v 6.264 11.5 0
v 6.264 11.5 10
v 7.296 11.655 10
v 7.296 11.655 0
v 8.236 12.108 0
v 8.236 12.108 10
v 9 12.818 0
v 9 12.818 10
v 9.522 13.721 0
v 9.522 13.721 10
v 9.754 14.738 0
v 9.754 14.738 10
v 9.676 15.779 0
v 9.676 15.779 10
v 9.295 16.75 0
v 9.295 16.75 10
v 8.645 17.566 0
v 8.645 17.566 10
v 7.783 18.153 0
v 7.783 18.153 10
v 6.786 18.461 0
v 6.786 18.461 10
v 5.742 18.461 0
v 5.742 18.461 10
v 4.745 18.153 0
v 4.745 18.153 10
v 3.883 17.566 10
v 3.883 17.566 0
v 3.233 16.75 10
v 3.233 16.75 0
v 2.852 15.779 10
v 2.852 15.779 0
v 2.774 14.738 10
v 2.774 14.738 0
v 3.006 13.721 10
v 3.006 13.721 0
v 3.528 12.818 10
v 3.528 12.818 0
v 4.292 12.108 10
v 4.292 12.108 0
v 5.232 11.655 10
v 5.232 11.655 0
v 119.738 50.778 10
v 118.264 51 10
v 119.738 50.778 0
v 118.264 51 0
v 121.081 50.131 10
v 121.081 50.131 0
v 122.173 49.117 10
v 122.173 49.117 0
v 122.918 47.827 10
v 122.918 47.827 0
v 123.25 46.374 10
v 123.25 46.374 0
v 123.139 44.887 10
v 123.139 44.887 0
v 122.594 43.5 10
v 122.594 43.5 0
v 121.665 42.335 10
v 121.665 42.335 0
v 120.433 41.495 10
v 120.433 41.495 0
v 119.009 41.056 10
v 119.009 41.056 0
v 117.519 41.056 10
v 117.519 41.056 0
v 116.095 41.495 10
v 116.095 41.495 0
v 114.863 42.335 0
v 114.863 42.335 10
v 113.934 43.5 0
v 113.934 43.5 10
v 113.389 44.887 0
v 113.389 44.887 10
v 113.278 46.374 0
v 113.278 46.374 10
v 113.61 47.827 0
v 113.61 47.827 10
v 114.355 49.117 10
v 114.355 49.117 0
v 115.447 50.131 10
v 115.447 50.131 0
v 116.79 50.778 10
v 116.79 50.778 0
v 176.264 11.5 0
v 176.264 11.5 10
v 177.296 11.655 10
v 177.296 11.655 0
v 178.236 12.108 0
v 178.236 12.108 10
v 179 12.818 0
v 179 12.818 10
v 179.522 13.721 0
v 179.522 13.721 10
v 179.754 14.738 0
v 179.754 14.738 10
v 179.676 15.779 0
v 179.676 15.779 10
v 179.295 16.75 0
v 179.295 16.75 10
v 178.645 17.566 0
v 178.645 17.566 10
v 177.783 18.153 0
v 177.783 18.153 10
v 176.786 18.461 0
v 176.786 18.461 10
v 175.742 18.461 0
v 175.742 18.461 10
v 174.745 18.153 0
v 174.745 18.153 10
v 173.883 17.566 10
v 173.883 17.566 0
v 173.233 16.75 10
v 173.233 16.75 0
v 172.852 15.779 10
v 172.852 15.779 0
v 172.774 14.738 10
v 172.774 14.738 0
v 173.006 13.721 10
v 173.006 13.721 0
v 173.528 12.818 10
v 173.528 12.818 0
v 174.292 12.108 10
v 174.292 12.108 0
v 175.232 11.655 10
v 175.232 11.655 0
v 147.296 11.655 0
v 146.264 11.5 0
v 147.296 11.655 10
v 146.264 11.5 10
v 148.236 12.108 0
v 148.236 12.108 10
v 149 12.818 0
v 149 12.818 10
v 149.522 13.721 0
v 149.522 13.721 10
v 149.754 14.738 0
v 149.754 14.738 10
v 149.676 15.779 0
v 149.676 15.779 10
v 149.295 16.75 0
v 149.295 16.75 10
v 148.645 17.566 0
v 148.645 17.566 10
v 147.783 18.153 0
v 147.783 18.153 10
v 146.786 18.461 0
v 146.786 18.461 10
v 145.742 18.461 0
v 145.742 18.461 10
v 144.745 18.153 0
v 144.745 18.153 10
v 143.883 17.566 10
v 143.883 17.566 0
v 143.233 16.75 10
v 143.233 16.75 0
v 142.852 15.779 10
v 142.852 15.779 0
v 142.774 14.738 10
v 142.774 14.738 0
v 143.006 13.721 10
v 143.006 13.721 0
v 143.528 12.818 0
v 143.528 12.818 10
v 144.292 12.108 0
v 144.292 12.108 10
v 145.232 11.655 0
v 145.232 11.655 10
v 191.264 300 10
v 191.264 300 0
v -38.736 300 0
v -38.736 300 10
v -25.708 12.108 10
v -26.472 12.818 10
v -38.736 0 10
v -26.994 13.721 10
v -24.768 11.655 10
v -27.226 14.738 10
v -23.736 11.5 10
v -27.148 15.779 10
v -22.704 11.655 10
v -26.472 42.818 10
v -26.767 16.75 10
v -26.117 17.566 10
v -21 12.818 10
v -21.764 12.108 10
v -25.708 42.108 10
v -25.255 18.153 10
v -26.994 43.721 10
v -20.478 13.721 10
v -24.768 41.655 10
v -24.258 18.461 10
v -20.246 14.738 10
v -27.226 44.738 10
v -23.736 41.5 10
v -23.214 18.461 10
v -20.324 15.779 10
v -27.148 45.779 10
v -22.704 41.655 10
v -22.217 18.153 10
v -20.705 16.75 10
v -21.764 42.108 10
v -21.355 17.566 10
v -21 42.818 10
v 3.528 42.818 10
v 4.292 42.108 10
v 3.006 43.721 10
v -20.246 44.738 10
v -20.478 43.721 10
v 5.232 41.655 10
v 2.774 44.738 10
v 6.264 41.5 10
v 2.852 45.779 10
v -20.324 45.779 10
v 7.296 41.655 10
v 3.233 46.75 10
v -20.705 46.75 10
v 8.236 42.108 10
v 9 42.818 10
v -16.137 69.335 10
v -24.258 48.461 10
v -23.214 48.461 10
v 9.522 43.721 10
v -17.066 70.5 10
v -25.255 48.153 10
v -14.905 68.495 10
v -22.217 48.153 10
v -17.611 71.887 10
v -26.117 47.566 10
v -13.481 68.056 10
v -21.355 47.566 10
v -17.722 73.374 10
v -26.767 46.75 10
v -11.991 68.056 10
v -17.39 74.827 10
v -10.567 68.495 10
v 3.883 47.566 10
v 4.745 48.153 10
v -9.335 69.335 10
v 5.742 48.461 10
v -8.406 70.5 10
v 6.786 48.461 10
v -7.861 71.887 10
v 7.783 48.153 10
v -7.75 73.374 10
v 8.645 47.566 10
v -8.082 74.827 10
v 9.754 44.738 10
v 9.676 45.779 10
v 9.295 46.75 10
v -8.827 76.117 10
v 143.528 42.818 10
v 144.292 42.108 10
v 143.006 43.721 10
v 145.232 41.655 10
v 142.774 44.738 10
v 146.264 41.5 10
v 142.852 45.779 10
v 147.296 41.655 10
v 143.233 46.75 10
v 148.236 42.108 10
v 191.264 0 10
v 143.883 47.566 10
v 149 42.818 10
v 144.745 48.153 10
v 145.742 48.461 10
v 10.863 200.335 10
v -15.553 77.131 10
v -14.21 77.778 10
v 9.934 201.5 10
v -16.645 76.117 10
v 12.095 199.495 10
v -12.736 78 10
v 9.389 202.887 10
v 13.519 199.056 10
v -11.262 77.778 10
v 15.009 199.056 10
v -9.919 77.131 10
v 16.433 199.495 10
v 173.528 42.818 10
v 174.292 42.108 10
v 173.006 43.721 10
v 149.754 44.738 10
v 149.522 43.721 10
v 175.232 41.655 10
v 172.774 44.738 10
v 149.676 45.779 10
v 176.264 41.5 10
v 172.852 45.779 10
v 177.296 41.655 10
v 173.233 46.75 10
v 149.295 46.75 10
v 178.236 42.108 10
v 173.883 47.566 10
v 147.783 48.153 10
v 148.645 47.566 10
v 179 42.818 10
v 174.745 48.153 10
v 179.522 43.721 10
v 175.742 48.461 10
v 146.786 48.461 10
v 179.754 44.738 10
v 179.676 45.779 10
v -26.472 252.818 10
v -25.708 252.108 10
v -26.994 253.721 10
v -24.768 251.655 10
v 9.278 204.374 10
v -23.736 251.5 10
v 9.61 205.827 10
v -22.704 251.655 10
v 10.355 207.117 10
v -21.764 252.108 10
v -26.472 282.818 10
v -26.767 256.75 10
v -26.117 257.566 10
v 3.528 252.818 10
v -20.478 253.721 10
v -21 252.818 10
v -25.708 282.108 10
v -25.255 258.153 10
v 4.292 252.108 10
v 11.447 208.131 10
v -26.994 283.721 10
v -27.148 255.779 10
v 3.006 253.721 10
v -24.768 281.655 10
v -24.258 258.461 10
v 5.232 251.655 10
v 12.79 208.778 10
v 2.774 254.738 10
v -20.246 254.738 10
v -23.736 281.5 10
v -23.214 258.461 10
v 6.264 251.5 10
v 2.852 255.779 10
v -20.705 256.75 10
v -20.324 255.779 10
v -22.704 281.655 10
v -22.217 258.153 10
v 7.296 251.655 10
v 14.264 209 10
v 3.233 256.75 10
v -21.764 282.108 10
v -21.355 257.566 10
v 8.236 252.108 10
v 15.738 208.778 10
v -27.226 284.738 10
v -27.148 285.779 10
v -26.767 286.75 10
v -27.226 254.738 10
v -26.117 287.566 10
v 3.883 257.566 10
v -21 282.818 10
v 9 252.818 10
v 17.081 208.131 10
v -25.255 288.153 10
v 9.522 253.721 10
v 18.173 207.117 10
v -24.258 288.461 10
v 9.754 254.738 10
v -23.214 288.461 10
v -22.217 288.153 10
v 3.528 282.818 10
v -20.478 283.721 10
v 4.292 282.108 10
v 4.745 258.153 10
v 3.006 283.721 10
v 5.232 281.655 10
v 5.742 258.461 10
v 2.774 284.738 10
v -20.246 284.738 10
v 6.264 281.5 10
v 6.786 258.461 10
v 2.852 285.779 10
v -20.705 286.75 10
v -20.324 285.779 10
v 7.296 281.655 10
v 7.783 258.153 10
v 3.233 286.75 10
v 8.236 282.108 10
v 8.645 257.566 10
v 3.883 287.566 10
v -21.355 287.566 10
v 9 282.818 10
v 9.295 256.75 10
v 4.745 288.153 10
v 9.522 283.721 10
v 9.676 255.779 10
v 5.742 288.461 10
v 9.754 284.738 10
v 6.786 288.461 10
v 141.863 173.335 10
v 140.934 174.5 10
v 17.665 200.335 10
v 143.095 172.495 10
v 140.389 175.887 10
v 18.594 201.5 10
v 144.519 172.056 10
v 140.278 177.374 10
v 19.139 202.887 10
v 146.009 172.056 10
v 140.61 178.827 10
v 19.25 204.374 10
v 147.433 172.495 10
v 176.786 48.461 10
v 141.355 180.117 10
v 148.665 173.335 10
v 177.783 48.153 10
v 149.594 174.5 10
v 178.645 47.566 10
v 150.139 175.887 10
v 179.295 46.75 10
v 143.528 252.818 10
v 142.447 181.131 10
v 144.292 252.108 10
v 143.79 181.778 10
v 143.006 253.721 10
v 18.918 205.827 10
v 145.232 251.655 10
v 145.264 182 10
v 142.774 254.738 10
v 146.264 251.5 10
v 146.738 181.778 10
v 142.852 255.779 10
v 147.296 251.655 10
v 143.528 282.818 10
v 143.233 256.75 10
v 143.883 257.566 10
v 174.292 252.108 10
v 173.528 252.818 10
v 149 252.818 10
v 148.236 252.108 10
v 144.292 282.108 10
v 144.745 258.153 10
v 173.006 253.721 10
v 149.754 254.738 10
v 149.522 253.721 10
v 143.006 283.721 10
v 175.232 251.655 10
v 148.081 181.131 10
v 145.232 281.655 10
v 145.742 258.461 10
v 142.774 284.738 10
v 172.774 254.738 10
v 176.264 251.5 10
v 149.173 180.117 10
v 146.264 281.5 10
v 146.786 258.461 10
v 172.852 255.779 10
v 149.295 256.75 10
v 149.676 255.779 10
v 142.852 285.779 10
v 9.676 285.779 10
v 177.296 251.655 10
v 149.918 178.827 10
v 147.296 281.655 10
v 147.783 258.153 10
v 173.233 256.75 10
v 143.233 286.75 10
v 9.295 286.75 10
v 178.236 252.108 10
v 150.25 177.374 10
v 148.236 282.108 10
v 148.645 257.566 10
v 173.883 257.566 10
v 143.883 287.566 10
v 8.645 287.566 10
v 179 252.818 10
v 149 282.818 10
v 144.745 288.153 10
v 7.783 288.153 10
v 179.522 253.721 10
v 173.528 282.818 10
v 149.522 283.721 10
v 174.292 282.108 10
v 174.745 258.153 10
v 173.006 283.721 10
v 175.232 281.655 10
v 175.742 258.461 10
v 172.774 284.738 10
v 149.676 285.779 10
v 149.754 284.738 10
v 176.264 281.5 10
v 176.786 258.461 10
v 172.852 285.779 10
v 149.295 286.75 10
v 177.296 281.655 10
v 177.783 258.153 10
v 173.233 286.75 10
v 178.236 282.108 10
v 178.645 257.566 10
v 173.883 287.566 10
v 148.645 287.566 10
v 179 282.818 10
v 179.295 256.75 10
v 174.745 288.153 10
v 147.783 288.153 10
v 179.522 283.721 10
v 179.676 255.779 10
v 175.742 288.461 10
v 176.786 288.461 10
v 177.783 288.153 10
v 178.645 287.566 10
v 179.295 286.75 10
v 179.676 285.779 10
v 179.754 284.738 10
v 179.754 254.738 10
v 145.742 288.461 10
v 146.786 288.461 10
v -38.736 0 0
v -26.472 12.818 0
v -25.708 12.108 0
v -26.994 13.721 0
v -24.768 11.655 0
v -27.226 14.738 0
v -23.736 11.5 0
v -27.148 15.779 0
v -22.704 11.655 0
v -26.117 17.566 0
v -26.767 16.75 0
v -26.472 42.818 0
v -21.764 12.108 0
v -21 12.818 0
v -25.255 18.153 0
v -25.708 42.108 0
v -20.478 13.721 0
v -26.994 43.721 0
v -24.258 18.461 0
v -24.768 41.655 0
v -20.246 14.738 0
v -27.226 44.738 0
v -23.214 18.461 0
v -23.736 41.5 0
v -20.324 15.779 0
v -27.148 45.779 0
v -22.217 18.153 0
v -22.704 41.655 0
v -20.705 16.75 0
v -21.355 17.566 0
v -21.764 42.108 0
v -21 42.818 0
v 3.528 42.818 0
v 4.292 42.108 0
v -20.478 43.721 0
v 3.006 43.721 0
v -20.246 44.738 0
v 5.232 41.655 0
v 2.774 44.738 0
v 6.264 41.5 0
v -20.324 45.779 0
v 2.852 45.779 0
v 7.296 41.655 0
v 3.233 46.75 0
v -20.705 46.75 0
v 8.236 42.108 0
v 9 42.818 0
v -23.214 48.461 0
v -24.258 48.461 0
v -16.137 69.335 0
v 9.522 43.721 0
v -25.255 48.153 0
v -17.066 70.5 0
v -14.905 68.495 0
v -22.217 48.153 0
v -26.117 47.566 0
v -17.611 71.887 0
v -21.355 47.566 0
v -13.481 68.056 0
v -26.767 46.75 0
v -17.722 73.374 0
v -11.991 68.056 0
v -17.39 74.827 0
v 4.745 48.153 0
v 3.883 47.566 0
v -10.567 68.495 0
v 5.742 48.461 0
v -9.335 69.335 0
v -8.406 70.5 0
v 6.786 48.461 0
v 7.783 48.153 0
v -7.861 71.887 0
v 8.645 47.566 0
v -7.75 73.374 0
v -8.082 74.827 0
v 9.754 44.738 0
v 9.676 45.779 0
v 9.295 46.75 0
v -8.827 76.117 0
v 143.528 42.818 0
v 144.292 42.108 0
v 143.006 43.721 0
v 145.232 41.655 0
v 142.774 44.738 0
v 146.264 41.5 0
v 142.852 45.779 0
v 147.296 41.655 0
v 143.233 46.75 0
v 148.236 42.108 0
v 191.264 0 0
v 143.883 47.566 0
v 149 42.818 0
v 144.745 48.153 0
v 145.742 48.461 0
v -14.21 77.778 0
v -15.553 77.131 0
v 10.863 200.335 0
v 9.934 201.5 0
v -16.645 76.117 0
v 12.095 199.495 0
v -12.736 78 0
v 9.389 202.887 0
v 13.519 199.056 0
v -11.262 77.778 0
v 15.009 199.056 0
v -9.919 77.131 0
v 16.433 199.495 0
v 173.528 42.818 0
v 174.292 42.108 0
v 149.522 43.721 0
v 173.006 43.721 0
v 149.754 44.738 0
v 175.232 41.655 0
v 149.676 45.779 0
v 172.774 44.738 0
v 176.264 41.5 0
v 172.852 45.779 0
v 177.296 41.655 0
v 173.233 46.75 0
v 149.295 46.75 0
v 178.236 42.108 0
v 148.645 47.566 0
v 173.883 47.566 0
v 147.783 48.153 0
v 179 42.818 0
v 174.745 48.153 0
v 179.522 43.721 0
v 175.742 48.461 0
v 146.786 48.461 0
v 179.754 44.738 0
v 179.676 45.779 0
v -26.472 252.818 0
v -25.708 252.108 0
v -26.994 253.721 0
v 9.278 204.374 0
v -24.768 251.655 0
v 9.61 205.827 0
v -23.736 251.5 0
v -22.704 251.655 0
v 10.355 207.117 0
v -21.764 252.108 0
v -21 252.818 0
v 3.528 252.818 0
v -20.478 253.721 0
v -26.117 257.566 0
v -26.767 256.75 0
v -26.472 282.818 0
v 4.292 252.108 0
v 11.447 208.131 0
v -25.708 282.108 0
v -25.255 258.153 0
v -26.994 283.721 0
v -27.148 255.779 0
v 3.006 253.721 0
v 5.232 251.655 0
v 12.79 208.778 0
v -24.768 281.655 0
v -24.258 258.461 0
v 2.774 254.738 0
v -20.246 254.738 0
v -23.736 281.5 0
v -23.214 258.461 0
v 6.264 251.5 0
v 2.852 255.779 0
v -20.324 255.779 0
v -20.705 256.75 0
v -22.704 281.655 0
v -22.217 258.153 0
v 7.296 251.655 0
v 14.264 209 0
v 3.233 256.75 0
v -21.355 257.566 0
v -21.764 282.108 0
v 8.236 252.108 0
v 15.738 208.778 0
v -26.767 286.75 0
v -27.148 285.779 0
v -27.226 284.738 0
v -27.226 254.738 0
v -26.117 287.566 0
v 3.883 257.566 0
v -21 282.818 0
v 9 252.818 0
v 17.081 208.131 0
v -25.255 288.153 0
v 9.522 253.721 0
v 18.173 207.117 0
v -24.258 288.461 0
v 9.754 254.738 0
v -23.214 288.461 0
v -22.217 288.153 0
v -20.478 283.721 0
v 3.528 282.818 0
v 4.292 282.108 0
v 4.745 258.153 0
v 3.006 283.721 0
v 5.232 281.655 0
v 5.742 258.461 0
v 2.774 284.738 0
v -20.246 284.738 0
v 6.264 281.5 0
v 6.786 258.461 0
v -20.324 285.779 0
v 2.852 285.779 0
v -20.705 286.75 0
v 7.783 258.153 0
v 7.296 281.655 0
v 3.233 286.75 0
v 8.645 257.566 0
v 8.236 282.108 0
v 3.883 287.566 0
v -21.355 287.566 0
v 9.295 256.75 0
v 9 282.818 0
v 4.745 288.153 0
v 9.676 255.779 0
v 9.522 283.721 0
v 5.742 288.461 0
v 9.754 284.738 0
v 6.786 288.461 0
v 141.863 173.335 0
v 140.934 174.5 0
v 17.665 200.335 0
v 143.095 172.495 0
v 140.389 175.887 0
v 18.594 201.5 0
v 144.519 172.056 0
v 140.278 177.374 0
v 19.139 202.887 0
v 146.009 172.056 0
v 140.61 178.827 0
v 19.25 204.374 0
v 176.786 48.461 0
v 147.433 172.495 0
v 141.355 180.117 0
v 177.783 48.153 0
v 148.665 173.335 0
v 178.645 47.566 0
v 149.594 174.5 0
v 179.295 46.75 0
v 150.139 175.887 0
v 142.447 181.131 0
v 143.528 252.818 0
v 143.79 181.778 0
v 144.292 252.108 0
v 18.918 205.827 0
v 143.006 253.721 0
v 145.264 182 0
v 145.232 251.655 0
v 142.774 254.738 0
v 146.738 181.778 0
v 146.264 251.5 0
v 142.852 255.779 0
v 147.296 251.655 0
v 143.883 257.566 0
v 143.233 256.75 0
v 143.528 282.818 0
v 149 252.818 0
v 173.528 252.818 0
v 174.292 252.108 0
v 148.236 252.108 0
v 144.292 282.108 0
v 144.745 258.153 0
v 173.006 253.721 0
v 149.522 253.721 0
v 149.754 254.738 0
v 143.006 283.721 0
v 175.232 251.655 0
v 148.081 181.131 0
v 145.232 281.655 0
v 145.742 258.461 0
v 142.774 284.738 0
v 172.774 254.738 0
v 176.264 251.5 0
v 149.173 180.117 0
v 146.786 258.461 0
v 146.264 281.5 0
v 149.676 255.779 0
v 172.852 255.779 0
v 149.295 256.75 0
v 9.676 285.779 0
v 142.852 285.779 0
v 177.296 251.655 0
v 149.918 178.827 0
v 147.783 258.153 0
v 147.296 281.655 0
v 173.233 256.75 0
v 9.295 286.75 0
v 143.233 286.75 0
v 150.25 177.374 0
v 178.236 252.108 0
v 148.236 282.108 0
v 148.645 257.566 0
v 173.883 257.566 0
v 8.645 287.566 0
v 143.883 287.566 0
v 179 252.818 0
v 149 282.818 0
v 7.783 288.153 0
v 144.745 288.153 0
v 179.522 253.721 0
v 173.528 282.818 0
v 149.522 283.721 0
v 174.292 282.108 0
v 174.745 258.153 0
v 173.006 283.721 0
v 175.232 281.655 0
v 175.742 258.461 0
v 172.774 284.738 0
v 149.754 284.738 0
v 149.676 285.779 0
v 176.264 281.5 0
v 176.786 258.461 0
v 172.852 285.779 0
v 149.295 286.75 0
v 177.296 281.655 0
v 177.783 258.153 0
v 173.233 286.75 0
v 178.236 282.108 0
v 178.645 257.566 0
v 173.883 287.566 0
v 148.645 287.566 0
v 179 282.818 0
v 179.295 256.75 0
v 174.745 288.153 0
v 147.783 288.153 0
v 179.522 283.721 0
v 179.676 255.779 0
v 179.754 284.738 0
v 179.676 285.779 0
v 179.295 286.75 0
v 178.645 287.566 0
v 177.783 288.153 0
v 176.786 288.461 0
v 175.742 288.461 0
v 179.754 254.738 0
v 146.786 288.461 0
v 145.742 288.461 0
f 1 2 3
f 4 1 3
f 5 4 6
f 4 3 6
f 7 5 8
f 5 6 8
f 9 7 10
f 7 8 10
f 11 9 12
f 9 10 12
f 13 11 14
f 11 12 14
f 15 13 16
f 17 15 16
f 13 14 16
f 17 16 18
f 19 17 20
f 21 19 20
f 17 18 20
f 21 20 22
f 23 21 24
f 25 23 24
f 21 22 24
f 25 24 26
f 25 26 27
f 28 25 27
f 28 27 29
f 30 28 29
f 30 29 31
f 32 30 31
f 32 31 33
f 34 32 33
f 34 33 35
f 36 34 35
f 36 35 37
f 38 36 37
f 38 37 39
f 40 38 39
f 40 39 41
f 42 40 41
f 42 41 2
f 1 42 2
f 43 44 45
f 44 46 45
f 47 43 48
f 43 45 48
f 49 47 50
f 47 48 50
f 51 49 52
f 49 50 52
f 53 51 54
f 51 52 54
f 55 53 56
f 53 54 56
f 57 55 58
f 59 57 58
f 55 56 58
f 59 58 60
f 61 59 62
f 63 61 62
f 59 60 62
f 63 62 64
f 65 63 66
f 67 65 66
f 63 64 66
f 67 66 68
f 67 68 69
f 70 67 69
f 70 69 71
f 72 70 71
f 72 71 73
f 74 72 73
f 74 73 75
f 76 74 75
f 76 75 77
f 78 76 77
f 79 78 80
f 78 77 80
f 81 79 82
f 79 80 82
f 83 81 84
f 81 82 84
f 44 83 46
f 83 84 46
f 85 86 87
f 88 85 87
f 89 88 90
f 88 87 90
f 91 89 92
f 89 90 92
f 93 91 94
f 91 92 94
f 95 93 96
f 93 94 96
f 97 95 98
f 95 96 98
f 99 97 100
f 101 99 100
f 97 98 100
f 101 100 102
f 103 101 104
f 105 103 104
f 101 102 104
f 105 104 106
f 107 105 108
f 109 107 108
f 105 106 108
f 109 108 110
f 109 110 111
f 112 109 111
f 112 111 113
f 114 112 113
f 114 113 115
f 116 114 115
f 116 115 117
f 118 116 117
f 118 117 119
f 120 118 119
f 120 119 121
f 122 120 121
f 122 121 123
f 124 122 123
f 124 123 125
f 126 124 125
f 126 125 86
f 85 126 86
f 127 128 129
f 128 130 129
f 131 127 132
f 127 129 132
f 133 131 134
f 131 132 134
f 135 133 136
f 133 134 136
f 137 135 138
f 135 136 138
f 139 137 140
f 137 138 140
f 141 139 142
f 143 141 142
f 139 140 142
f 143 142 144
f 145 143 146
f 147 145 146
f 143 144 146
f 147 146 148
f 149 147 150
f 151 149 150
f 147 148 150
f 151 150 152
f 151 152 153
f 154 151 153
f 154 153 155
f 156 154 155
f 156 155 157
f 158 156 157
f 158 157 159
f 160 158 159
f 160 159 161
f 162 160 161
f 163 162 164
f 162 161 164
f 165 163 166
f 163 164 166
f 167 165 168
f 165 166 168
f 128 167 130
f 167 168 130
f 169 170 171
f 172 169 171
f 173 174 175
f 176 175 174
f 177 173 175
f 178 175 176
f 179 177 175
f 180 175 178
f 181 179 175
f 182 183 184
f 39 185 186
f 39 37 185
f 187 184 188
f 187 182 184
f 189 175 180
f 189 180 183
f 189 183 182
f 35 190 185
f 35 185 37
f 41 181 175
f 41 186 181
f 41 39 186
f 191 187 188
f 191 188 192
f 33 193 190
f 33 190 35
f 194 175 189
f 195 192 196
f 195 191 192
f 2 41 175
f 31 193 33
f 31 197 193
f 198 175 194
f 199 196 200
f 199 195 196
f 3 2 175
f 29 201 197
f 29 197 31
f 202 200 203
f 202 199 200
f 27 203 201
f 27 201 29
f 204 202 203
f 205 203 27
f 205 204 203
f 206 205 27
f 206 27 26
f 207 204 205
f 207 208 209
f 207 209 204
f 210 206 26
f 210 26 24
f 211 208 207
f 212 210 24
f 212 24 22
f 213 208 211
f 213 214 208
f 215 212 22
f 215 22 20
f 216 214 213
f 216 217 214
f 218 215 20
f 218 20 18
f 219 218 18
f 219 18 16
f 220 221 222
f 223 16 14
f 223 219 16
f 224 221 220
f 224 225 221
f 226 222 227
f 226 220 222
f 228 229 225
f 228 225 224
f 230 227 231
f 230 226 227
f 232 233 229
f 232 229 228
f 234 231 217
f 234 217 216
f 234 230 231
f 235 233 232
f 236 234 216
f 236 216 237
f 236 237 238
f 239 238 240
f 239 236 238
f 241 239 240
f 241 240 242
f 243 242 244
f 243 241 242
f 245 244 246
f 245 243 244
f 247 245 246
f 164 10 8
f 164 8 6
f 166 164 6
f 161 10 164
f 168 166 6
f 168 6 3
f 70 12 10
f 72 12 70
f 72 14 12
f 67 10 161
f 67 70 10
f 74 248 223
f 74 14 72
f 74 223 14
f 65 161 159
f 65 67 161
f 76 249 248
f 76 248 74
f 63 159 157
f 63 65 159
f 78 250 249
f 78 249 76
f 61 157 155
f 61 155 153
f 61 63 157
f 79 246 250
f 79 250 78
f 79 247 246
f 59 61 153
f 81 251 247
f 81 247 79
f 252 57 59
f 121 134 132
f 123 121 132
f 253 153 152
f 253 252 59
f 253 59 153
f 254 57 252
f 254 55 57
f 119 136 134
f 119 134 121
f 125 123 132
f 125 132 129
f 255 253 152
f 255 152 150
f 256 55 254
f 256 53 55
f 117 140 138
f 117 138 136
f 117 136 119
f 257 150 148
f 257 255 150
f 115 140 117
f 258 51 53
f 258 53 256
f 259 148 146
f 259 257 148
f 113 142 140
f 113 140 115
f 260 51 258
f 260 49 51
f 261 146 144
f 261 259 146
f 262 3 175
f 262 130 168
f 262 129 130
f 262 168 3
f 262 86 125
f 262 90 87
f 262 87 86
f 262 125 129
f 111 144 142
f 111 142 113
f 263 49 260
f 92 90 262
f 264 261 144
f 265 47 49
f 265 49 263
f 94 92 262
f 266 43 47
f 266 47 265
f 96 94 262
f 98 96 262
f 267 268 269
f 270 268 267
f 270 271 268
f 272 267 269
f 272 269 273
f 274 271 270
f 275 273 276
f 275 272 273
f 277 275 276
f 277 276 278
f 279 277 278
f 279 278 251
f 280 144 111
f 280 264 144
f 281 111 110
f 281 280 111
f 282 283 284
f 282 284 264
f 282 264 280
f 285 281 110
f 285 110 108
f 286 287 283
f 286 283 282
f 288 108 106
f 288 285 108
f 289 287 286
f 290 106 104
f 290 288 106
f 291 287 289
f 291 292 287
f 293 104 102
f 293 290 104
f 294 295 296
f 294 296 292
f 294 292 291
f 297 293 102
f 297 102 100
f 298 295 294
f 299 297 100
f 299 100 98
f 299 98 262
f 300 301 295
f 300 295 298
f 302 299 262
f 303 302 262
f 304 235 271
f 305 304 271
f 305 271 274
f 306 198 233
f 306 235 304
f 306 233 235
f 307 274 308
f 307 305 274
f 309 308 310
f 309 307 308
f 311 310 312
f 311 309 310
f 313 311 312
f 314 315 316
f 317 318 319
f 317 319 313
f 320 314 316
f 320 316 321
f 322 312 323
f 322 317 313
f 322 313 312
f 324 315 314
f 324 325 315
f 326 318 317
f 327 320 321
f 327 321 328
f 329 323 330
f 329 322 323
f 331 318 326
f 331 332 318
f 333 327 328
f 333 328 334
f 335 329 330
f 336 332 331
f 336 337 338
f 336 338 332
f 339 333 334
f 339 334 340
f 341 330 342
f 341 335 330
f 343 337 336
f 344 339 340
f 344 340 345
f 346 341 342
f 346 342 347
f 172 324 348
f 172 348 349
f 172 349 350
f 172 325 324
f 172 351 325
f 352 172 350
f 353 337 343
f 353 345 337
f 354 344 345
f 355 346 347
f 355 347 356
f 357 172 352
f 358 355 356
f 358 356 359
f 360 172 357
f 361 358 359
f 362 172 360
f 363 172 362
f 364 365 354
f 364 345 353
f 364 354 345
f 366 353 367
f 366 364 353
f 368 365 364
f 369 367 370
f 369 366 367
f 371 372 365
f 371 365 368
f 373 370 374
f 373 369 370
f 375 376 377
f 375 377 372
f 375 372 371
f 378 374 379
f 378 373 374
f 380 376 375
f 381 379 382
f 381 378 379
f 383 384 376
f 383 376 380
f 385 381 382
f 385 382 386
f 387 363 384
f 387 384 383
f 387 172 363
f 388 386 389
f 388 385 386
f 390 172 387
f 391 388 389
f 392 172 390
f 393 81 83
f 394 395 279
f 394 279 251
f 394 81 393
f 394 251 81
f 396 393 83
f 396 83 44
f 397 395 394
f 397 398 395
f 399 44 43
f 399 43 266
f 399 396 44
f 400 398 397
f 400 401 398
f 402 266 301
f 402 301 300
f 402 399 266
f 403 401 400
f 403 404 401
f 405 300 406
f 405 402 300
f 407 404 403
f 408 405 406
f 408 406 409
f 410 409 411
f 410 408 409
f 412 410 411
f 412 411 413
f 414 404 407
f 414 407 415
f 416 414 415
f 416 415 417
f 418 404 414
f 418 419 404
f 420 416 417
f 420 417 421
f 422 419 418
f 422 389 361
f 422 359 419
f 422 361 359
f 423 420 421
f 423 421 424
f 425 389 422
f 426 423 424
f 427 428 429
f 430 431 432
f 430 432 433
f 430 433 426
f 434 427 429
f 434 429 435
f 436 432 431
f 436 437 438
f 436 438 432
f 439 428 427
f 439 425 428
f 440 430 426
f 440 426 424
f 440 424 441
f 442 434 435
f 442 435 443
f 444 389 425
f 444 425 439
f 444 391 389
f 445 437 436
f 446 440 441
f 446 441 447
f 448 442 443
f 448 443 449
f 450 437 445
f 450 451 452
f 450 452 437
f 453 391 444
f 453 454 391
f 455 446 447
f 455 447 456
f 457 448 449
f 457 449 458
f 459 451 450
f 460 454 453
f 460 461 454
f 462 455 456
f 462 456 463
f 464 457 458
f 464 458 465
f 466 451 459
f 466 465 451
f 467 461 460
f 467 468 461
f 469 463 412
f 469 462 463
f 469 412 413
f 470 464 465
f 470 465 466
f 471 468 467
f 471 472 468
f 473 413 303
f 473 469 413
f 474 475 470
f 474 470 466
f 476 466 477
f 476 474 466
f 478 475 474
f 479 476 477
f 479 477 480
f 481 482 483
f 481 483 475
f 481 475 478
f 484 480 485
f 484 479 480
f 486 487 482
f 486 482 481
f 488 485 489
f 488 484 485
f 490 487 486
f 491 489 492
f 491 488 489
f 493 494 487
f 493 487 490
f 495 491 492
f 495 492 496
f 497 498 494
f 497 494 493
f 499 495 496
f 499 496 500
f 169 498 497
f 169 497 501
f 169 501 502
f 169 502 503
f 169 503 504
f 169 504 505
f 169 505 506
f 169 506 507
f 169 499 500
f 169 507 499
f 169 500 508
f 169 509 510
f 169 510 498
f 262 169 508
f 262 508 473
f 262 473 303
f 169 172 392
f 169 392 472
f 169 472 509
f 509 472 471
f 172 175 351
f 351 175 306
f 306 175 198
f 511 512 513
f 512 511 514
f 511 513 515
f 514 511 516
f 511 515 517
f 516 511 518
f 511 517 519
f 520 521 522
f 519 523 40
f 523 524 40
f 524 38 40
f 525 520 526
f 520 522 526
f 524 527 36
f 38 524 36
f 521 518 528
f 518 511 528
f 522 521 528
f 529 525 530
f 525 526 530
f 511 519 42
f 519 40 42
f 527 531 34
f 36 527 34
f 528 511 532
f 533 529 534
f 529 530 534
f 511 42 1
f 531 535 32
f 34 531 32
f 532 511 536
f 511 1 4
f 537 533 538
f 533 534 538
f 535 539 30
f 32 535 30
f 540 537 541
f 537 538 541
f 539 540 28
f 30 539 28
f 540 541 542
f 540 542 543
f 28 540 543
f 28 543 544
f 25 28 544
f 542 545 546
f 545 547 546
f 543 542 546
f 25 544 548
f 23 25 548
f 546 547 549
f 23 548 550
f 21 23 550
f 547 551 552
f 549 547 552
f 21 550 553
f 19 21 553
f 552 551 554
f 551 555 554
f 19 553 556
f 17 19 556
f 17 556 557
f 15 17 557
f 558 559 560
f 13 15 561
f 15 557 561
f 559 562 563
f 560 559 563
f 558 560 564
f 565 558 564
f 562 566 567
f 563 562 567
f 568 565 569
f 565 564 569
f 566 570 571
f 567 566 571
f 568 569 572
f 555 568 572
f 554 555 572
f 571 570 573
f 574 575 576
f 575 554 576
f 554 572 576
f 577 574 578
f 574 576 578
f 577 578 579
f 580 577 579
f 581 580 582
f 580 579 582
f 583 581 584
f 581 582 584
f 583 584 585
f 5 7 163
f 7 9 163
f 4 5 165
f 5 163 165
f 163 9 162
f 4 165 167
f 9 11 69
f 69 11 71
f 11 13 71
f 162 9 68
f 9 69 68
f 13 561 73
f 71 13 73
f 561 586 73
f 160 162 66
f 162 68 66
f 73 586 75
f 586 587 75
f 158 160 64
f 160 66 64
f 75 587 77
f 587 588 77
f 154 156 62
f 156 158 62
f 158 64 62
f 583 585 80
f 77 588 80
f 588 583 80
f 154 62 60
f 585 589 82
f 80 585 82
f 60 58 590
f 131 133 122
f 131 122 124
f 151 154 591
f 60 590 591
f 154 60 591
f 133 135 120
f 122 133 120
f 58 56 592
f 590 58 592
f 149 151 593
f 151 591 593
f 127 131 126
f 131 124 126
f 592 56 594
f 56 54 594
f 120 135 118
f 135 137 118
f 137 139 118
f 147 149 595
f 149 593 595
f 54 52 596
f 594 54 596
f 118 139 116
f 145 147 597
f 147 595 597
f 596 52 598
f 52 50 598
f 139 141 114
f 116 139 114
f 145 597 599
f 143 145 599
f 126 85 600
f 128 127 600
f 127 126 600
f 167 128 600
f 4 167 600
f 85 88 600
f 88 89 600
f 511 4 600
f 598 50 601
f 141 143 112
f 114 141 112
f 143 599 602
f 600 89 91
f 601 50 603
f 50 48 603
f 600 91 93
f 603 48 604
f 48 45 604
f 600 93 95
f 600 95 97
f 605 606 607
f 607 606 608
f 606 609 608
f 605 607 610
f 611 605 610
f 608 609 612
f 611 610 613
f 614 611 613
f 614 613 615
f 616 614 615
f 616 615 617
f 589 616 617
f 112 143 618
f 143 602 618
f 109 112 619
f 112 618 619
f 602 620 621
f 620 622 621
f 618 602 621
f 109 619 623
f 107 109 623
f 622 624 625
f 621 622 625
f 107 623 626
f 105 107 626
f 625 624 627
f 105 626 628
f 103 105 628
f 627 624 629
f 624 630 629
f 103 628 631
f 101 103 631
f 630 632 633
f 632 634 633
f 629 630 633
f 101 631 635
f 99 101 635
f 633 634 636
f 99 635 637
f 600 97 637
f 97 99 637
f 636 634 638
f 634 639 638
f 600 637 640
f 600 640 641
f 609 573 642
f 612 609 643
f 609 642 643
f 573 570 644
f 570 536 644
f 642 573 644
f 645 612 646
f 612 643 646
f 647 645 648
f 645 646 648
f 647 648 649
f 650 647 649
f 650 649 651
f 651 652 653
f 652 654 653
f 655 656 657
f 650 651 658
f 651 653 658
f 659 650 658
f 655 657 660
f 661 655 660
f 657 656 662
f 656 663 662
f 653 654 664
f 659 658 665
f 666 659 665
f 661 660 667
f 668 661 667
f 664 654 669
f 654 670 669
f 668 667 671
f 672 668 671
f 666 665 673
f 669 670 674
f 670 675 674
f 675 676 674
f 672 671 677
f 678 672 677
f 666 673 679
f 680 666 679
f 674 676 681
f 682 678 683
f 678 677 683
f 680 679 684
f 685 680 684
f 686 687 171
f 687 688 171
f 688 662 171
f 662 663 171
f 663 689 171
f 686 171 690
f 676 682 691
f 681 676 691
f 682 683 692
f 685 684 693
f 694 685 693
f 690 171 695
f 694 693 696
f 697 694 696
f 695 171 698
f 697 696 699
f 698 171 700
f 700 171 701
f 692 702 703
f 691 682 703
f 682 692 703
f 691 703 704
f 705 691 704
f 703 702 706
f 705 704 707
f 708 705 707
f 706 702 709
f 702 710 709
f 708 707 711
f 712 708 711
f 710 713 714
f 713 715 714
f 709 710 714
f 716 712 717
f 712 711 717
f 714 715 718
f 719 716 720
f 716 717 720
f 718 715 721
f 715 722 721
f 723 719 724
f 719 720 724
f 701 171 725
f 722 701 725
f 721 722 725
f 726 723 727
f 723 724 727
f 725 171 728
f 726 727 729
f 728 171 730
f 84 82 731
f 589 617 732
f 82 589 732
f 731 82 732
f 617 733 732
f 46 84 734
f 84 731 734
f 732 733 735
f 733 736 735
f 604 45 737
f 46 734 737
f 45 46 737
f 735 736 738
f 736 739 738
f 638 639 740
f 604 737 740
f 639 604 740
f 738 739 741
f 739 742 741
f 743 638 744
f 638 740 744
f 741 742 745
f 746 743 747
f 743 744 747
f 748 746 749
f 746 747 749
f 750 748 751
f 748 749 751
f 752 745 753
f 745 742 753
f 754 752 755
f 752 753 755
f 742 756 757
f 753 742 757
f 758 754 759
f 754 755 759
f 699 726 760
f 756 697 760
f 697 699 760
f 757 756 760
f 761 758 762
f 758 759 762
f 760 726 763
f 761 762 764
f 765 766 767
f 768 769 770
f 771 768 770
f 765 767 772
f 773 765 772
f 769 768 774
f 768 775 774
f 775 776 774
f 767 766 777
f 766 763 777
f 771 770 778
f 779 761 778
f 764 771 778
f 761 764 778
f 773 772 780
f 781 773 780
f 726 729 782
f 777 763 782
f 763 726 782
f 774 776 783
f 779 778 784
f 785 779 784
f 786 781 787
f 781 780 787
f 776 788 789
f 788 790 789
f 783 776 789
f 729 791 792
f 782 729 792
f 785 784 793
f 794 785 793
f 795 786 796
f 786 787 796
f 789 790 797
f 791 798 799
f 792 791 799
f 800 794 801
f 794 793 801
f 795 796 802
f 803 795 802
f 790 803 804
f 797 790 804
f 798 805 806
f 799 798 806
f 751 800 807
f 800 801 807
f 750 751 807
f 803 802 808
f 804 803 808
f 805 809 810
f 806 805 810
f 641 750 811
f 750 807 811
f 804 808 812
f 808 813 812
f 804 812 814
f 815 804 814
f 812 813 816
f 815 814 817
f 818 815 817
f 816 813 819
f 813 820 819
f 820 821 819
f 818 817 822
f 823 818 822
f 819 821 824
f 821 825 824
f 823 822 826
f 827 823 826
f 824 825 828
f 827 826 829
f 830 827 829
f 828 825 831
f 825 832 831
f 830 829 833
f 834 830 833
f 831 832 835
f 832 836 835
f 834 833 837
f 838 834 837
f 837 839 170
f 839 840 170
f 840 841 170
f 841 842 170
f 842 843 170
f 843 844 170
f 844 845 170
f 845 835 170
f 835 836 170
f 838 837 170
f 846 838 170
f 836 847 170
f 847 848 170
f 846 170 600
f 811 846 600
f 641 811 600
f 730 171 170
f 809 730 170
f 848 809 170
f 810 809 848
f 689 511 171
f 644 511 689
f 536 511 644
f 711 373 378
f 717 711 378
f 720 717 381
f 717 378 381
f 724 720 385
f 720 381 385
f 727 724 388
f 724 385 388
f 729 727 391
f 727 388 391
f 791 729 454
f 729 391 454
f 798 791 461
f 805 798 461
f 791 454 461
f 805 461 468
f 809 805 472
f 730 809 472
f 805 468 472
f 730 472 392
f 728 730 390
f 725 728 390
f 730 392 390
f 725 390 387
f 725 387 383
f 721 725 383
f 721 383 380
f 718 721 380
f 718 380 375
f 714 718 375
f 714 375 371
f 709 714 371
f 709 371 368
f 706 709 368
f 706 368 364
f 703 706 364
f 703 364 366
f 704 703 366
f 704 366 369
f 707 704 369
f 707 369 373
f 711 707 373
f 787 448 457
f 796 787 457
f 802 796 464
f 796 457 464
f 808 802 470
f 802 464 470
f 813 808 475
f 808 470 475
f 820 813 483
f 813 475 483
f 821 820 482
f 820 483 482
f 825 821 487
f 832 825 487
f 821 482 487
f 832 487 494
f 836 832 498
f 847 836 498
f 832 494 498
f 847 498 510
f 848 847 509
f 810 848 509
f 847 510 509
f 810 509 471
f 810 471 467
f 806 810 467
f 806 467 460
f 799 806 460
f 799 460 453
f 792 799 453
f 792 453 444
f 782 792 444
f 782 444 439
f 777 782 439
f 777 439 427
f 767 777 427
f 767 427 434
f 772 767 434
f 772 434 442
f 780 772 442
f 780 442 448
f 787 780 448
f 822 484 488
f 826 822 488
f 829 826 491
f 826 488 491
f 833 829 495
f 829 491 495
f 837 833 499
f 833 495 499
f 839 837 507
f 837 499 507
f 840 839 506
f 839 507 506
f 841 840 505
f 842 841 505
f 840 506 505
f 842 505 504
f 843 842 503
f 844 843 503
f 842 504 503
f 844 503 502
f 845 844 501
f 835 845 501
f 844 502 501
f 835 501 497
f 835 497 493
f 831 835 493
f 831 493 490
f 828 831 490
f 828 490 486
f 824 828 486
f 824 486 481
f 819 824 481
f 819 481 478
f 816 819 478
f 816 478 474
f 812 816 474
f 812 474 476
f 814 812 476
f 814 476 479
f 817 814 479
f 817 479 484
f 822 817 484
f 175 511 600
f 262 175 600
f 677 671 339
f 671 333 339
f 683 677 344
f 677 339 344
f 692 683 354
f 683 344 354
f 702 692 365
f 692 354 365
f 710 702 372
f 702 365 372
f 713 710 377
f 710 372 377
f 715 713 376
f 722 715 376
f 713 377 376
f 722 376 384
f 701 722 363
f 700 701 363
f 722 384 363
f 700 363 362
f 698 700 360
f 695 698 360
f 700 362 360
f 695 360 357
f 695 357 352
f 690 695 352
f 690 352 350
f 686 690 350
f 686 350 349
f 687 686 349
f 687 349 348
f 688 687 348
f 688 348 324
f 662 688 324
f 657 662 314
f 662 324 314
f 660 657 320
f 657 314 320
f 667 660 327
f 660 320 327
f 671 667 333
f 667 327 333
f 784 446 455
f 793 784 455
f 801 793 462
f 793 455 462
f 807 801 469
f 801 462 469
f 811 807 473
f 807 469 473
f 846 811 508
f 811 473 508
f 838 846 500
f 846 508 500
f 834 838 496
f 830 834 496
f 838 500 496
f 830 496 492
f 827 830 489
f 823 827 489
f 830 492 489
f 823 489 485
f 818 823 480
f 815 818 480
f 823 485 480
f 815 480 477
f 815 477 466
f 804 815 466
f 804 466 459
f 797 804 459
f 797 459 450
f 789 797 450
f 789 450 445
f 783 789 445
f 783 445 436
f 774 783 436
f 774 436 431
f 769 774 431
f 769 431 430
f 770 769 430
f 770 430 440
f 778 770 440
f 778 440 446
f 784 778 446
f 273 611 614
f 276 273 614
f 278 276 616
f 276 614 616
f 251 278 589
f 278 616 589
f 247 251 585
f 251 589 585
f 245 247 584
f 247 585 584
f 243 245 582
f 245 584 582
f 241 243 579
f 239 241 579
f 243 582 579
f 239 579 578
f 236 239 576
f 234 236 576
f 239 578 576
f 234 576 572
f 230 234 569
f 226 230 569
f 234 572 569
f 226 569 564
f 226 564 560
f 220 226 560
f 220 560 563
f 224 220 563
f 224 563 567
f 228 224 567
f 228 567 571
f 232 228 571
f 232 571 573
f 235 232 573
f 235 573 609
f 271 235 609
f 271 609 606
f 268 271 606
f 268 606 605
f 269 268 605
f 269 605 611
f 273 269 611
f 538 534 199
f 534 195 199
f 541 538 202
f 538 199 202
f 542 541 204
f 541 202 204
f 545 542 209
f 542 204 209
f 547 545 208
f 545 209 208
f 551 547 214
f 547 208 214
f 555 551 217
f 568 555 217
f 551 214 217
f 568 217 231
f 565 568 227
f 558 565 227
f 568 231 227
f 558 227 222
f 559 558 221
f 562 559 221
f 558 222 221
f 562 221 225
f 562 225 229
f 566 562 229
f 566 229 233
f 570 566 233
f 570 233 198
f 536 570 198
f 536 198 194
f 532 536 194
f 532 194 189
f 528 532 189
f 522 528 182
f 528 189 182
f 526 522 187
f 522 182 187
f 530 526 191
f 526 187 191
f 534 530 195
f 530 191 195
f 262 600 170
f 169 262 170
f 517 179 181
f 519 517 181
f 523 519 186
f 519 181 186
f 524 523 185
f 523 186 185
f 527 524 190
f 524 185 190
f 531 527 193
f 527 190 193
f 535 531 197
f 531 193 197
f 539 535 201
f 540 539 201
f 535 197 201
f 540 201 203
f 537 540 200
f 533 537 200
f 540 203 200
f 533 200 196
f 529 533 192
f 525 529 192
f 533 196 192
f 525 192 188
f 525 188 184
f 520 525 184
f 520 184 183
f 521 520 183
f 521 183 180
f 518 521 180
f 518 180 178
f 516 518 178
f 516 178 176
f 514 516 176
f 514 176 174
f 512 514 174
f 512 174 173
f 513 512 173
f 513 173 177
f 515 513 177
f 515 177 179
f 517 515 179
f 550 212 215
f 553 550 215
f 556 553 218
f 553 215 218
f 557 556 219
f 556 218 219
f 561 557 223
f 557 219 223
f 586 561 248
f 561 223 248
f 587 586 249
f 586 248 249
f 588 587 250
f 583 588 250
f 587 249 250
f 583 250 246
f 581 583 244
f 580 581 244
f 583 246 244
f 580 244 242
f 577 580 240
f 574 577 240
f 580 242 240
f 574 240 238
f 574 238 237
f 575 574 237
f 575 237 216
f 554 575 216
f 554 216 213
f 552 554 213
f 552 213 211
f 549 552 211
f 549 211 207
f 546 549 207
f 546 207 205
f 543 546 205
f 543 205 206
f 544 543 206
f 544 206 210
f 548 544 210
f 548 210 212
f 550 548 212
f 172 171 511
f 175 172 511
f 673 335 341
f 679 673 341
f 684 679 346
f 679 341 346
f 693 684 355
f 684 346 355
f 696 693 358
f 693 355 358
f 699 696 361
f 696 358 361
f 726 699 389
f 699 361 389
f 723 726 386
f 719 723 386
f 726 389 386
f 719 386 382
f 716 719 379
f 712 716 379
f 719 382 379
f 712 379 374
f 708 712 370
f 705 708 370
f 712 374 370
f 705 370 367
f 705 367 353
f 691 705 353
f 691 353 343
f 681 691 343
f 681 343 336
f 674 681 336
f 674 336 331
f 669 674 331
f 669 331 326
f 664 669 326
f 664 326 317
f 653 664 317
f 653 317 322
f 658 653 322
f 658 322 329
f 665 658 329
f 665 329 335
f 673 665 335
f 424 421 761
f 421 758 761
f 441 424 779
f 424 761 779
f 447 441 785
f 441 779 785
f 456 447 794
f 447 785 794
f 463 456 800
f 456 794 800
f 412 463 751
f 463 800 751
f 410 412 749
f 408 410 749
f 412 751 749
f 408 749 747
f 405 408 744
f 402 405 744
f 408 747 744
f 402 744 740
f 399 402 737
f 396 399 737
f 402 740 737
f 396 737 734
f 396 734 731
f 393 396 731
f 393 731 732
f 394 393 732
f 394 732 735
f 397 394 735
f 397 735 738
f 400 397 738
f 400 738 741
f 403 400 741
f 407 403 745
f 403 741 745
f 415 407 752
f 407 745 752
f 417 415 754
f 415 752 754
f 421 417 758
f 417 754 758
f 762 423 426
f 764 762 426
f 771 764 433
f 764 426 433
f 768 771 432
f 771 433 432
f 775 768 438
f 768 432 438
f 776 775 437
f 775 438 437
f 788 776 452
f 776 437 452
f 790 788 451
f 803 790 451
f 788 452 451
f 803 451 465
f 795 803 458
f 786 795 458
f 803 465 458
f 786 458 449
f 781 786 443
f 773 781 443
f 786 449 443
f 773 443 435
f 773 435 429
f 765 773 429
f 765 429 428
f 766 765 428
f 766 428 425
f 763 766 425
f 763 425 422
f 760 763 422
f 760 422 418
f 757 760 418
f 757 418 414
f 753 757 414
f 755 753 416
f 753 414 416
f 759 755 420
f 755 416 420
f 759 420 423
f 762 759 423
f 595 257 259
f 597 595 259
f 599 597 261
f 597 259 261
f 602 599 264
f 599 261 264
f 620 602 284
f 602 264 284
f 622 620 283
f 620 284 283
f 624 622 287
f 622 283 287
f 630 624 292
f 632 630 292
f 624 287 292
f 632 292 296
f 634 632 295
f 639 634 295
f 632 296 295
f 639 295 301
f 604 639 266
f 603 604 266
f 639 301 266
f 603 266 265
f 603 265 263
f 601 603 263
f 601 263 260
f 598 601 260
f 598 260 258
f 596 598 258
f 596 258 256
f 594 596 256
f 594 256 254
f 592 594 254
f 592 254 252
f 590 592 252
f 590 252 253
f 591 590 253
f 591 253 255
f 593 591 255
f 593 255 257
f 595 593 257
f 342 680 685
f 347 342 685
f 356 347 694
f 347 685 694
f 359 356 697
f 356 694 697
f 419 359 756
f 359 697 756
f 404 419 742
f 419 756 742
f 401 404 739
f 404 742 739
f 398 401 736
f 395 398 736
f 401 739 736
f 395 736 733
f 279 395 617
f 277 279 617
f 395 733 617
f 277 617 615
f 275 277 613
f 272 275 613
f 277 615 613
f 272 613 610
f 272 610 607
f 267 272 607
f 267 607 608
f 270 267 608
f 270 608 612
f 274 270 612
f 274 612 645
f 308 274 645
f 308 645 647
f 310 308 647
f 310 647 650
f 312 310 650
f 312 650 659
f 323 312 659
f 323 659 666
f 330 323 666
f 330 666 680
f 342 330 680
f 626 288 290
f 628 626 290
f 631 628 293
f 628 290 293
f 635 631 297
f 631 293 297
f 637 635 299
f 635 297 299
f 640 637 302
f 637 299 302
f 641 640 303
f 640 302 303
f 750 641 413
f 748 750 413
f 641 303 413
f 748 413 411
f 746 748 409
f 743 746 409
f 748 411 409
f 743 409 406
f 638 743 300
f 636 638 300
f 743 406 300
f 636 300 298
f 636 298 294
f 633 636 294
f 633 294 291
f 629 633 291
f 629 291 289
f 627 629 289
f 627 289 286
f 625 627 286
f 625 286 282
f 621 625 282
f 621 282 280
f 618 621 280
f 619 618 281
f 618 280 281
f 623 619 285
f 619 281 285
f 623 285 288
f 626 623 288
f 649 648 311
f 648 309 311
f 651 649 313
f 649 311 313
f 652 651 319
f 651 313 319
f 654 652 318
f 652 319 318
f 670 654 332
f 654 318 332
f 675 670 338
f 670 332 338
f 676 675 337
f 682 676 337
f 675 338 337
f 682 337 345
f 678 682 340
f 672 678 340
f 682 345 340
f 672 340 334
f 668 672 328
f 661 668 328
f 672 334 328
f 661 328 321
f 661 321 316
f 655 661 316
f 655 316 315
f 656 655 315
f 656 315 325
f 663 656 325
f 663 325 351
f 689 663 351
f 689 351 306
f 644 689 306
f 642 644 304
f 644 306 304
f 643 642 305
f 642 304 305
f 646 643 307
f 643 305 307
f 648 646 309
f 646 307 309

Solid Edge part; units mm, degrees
sketch "Sketch1" plane through (0, 0, 0) normal (0, 0, 1) x (1, 0, 0)
  line L0 (-38.736, 0) -> (191.264, 0)
  line L1 (191.264, 0) -> (191.264, 300)
  line L2 (191.264, 300) -> (-38.736, 300)
  line L3 (-38.736, 300) -> (-38.736, 0)
  dimension "D1" = 300
  dimension "D2" = 230
extrude "Protrusion1" add sketch "Sketch1" along normal blind 10
hole "Hole_1" at (6.264, 285, 10) direction (0, 0, -1) diameter 7 end up to next
hole "Hole1" at (6.264, 255, 10) direction (0, 0, -1) diameter 7 end up to next
hole "Hole2" at (-23.736, 255, 10) direction (0, 0, -1) diameter 7 end up to next
hole "Hole3" at (-23.736, 45, 10) direction (0, 0, -1) diameter 7 end up to next
hole "Hole4" at (6.264, 45, 10) direction (0, 0, -1) diameter 7 end up to next
hole "Hole5" at (6.264, 15, 10) direction (0, 0, -1) diameter 7 end up to next
hole "Hole6" at (-23.736, 15, 10) direction (0, 0, -1) diameter 7 end up to next
hole "Hole7" at (-23.736, 285, 10) direction (0, 0, -1) diameter 7 end up to next
hole "Hole8" at (146.264, 45, 10) direction (0, 0, -1) diameter 7 end up to next
hole "Hole9" at (176.264, 45, 10) direction (0, 0, -1) diameter 7 end up to next
hole "Hole10" at (176.264, 15, 10) direction (0, 0, -1) diameter 7 end up to next
hole "Hole11" at (146.264, 15, 10) direction (0, 0, -1) diameter 7 end up to next
hole "Hole12" at (146.264, 285, 10) direction (0, 0, -1) diameter 7 end up to next
hole "Hole13" at (176.264, 285, 10) direction (0, 0, -1) diameter 7 end up to next
hole "Hole14" at (176.264, 255, 10) direction (0, 0, -1) diameter 7 end up to next
hole "Hole15" at (146.264, 255, 10) direction (0, 0, -1) diameter 7 end up to next
hole "Hole_30" at (14.264, 204, 0) direction (0, 0, 1) diameter 10 end up to next
hole "Hole16" at (-12.736, 73, 0) direction (0, 0, 1) diameter 10 end up to next
hole "Hole17" at (118.264, 46, 0) direction (0, 0, 1) diameter 10 end up to next
hole "Hole18" at (145.264, 177, 0) direction (0, 0, 1) diameter 10 end up to next
properties material "Aluminum, 6061-T6"
